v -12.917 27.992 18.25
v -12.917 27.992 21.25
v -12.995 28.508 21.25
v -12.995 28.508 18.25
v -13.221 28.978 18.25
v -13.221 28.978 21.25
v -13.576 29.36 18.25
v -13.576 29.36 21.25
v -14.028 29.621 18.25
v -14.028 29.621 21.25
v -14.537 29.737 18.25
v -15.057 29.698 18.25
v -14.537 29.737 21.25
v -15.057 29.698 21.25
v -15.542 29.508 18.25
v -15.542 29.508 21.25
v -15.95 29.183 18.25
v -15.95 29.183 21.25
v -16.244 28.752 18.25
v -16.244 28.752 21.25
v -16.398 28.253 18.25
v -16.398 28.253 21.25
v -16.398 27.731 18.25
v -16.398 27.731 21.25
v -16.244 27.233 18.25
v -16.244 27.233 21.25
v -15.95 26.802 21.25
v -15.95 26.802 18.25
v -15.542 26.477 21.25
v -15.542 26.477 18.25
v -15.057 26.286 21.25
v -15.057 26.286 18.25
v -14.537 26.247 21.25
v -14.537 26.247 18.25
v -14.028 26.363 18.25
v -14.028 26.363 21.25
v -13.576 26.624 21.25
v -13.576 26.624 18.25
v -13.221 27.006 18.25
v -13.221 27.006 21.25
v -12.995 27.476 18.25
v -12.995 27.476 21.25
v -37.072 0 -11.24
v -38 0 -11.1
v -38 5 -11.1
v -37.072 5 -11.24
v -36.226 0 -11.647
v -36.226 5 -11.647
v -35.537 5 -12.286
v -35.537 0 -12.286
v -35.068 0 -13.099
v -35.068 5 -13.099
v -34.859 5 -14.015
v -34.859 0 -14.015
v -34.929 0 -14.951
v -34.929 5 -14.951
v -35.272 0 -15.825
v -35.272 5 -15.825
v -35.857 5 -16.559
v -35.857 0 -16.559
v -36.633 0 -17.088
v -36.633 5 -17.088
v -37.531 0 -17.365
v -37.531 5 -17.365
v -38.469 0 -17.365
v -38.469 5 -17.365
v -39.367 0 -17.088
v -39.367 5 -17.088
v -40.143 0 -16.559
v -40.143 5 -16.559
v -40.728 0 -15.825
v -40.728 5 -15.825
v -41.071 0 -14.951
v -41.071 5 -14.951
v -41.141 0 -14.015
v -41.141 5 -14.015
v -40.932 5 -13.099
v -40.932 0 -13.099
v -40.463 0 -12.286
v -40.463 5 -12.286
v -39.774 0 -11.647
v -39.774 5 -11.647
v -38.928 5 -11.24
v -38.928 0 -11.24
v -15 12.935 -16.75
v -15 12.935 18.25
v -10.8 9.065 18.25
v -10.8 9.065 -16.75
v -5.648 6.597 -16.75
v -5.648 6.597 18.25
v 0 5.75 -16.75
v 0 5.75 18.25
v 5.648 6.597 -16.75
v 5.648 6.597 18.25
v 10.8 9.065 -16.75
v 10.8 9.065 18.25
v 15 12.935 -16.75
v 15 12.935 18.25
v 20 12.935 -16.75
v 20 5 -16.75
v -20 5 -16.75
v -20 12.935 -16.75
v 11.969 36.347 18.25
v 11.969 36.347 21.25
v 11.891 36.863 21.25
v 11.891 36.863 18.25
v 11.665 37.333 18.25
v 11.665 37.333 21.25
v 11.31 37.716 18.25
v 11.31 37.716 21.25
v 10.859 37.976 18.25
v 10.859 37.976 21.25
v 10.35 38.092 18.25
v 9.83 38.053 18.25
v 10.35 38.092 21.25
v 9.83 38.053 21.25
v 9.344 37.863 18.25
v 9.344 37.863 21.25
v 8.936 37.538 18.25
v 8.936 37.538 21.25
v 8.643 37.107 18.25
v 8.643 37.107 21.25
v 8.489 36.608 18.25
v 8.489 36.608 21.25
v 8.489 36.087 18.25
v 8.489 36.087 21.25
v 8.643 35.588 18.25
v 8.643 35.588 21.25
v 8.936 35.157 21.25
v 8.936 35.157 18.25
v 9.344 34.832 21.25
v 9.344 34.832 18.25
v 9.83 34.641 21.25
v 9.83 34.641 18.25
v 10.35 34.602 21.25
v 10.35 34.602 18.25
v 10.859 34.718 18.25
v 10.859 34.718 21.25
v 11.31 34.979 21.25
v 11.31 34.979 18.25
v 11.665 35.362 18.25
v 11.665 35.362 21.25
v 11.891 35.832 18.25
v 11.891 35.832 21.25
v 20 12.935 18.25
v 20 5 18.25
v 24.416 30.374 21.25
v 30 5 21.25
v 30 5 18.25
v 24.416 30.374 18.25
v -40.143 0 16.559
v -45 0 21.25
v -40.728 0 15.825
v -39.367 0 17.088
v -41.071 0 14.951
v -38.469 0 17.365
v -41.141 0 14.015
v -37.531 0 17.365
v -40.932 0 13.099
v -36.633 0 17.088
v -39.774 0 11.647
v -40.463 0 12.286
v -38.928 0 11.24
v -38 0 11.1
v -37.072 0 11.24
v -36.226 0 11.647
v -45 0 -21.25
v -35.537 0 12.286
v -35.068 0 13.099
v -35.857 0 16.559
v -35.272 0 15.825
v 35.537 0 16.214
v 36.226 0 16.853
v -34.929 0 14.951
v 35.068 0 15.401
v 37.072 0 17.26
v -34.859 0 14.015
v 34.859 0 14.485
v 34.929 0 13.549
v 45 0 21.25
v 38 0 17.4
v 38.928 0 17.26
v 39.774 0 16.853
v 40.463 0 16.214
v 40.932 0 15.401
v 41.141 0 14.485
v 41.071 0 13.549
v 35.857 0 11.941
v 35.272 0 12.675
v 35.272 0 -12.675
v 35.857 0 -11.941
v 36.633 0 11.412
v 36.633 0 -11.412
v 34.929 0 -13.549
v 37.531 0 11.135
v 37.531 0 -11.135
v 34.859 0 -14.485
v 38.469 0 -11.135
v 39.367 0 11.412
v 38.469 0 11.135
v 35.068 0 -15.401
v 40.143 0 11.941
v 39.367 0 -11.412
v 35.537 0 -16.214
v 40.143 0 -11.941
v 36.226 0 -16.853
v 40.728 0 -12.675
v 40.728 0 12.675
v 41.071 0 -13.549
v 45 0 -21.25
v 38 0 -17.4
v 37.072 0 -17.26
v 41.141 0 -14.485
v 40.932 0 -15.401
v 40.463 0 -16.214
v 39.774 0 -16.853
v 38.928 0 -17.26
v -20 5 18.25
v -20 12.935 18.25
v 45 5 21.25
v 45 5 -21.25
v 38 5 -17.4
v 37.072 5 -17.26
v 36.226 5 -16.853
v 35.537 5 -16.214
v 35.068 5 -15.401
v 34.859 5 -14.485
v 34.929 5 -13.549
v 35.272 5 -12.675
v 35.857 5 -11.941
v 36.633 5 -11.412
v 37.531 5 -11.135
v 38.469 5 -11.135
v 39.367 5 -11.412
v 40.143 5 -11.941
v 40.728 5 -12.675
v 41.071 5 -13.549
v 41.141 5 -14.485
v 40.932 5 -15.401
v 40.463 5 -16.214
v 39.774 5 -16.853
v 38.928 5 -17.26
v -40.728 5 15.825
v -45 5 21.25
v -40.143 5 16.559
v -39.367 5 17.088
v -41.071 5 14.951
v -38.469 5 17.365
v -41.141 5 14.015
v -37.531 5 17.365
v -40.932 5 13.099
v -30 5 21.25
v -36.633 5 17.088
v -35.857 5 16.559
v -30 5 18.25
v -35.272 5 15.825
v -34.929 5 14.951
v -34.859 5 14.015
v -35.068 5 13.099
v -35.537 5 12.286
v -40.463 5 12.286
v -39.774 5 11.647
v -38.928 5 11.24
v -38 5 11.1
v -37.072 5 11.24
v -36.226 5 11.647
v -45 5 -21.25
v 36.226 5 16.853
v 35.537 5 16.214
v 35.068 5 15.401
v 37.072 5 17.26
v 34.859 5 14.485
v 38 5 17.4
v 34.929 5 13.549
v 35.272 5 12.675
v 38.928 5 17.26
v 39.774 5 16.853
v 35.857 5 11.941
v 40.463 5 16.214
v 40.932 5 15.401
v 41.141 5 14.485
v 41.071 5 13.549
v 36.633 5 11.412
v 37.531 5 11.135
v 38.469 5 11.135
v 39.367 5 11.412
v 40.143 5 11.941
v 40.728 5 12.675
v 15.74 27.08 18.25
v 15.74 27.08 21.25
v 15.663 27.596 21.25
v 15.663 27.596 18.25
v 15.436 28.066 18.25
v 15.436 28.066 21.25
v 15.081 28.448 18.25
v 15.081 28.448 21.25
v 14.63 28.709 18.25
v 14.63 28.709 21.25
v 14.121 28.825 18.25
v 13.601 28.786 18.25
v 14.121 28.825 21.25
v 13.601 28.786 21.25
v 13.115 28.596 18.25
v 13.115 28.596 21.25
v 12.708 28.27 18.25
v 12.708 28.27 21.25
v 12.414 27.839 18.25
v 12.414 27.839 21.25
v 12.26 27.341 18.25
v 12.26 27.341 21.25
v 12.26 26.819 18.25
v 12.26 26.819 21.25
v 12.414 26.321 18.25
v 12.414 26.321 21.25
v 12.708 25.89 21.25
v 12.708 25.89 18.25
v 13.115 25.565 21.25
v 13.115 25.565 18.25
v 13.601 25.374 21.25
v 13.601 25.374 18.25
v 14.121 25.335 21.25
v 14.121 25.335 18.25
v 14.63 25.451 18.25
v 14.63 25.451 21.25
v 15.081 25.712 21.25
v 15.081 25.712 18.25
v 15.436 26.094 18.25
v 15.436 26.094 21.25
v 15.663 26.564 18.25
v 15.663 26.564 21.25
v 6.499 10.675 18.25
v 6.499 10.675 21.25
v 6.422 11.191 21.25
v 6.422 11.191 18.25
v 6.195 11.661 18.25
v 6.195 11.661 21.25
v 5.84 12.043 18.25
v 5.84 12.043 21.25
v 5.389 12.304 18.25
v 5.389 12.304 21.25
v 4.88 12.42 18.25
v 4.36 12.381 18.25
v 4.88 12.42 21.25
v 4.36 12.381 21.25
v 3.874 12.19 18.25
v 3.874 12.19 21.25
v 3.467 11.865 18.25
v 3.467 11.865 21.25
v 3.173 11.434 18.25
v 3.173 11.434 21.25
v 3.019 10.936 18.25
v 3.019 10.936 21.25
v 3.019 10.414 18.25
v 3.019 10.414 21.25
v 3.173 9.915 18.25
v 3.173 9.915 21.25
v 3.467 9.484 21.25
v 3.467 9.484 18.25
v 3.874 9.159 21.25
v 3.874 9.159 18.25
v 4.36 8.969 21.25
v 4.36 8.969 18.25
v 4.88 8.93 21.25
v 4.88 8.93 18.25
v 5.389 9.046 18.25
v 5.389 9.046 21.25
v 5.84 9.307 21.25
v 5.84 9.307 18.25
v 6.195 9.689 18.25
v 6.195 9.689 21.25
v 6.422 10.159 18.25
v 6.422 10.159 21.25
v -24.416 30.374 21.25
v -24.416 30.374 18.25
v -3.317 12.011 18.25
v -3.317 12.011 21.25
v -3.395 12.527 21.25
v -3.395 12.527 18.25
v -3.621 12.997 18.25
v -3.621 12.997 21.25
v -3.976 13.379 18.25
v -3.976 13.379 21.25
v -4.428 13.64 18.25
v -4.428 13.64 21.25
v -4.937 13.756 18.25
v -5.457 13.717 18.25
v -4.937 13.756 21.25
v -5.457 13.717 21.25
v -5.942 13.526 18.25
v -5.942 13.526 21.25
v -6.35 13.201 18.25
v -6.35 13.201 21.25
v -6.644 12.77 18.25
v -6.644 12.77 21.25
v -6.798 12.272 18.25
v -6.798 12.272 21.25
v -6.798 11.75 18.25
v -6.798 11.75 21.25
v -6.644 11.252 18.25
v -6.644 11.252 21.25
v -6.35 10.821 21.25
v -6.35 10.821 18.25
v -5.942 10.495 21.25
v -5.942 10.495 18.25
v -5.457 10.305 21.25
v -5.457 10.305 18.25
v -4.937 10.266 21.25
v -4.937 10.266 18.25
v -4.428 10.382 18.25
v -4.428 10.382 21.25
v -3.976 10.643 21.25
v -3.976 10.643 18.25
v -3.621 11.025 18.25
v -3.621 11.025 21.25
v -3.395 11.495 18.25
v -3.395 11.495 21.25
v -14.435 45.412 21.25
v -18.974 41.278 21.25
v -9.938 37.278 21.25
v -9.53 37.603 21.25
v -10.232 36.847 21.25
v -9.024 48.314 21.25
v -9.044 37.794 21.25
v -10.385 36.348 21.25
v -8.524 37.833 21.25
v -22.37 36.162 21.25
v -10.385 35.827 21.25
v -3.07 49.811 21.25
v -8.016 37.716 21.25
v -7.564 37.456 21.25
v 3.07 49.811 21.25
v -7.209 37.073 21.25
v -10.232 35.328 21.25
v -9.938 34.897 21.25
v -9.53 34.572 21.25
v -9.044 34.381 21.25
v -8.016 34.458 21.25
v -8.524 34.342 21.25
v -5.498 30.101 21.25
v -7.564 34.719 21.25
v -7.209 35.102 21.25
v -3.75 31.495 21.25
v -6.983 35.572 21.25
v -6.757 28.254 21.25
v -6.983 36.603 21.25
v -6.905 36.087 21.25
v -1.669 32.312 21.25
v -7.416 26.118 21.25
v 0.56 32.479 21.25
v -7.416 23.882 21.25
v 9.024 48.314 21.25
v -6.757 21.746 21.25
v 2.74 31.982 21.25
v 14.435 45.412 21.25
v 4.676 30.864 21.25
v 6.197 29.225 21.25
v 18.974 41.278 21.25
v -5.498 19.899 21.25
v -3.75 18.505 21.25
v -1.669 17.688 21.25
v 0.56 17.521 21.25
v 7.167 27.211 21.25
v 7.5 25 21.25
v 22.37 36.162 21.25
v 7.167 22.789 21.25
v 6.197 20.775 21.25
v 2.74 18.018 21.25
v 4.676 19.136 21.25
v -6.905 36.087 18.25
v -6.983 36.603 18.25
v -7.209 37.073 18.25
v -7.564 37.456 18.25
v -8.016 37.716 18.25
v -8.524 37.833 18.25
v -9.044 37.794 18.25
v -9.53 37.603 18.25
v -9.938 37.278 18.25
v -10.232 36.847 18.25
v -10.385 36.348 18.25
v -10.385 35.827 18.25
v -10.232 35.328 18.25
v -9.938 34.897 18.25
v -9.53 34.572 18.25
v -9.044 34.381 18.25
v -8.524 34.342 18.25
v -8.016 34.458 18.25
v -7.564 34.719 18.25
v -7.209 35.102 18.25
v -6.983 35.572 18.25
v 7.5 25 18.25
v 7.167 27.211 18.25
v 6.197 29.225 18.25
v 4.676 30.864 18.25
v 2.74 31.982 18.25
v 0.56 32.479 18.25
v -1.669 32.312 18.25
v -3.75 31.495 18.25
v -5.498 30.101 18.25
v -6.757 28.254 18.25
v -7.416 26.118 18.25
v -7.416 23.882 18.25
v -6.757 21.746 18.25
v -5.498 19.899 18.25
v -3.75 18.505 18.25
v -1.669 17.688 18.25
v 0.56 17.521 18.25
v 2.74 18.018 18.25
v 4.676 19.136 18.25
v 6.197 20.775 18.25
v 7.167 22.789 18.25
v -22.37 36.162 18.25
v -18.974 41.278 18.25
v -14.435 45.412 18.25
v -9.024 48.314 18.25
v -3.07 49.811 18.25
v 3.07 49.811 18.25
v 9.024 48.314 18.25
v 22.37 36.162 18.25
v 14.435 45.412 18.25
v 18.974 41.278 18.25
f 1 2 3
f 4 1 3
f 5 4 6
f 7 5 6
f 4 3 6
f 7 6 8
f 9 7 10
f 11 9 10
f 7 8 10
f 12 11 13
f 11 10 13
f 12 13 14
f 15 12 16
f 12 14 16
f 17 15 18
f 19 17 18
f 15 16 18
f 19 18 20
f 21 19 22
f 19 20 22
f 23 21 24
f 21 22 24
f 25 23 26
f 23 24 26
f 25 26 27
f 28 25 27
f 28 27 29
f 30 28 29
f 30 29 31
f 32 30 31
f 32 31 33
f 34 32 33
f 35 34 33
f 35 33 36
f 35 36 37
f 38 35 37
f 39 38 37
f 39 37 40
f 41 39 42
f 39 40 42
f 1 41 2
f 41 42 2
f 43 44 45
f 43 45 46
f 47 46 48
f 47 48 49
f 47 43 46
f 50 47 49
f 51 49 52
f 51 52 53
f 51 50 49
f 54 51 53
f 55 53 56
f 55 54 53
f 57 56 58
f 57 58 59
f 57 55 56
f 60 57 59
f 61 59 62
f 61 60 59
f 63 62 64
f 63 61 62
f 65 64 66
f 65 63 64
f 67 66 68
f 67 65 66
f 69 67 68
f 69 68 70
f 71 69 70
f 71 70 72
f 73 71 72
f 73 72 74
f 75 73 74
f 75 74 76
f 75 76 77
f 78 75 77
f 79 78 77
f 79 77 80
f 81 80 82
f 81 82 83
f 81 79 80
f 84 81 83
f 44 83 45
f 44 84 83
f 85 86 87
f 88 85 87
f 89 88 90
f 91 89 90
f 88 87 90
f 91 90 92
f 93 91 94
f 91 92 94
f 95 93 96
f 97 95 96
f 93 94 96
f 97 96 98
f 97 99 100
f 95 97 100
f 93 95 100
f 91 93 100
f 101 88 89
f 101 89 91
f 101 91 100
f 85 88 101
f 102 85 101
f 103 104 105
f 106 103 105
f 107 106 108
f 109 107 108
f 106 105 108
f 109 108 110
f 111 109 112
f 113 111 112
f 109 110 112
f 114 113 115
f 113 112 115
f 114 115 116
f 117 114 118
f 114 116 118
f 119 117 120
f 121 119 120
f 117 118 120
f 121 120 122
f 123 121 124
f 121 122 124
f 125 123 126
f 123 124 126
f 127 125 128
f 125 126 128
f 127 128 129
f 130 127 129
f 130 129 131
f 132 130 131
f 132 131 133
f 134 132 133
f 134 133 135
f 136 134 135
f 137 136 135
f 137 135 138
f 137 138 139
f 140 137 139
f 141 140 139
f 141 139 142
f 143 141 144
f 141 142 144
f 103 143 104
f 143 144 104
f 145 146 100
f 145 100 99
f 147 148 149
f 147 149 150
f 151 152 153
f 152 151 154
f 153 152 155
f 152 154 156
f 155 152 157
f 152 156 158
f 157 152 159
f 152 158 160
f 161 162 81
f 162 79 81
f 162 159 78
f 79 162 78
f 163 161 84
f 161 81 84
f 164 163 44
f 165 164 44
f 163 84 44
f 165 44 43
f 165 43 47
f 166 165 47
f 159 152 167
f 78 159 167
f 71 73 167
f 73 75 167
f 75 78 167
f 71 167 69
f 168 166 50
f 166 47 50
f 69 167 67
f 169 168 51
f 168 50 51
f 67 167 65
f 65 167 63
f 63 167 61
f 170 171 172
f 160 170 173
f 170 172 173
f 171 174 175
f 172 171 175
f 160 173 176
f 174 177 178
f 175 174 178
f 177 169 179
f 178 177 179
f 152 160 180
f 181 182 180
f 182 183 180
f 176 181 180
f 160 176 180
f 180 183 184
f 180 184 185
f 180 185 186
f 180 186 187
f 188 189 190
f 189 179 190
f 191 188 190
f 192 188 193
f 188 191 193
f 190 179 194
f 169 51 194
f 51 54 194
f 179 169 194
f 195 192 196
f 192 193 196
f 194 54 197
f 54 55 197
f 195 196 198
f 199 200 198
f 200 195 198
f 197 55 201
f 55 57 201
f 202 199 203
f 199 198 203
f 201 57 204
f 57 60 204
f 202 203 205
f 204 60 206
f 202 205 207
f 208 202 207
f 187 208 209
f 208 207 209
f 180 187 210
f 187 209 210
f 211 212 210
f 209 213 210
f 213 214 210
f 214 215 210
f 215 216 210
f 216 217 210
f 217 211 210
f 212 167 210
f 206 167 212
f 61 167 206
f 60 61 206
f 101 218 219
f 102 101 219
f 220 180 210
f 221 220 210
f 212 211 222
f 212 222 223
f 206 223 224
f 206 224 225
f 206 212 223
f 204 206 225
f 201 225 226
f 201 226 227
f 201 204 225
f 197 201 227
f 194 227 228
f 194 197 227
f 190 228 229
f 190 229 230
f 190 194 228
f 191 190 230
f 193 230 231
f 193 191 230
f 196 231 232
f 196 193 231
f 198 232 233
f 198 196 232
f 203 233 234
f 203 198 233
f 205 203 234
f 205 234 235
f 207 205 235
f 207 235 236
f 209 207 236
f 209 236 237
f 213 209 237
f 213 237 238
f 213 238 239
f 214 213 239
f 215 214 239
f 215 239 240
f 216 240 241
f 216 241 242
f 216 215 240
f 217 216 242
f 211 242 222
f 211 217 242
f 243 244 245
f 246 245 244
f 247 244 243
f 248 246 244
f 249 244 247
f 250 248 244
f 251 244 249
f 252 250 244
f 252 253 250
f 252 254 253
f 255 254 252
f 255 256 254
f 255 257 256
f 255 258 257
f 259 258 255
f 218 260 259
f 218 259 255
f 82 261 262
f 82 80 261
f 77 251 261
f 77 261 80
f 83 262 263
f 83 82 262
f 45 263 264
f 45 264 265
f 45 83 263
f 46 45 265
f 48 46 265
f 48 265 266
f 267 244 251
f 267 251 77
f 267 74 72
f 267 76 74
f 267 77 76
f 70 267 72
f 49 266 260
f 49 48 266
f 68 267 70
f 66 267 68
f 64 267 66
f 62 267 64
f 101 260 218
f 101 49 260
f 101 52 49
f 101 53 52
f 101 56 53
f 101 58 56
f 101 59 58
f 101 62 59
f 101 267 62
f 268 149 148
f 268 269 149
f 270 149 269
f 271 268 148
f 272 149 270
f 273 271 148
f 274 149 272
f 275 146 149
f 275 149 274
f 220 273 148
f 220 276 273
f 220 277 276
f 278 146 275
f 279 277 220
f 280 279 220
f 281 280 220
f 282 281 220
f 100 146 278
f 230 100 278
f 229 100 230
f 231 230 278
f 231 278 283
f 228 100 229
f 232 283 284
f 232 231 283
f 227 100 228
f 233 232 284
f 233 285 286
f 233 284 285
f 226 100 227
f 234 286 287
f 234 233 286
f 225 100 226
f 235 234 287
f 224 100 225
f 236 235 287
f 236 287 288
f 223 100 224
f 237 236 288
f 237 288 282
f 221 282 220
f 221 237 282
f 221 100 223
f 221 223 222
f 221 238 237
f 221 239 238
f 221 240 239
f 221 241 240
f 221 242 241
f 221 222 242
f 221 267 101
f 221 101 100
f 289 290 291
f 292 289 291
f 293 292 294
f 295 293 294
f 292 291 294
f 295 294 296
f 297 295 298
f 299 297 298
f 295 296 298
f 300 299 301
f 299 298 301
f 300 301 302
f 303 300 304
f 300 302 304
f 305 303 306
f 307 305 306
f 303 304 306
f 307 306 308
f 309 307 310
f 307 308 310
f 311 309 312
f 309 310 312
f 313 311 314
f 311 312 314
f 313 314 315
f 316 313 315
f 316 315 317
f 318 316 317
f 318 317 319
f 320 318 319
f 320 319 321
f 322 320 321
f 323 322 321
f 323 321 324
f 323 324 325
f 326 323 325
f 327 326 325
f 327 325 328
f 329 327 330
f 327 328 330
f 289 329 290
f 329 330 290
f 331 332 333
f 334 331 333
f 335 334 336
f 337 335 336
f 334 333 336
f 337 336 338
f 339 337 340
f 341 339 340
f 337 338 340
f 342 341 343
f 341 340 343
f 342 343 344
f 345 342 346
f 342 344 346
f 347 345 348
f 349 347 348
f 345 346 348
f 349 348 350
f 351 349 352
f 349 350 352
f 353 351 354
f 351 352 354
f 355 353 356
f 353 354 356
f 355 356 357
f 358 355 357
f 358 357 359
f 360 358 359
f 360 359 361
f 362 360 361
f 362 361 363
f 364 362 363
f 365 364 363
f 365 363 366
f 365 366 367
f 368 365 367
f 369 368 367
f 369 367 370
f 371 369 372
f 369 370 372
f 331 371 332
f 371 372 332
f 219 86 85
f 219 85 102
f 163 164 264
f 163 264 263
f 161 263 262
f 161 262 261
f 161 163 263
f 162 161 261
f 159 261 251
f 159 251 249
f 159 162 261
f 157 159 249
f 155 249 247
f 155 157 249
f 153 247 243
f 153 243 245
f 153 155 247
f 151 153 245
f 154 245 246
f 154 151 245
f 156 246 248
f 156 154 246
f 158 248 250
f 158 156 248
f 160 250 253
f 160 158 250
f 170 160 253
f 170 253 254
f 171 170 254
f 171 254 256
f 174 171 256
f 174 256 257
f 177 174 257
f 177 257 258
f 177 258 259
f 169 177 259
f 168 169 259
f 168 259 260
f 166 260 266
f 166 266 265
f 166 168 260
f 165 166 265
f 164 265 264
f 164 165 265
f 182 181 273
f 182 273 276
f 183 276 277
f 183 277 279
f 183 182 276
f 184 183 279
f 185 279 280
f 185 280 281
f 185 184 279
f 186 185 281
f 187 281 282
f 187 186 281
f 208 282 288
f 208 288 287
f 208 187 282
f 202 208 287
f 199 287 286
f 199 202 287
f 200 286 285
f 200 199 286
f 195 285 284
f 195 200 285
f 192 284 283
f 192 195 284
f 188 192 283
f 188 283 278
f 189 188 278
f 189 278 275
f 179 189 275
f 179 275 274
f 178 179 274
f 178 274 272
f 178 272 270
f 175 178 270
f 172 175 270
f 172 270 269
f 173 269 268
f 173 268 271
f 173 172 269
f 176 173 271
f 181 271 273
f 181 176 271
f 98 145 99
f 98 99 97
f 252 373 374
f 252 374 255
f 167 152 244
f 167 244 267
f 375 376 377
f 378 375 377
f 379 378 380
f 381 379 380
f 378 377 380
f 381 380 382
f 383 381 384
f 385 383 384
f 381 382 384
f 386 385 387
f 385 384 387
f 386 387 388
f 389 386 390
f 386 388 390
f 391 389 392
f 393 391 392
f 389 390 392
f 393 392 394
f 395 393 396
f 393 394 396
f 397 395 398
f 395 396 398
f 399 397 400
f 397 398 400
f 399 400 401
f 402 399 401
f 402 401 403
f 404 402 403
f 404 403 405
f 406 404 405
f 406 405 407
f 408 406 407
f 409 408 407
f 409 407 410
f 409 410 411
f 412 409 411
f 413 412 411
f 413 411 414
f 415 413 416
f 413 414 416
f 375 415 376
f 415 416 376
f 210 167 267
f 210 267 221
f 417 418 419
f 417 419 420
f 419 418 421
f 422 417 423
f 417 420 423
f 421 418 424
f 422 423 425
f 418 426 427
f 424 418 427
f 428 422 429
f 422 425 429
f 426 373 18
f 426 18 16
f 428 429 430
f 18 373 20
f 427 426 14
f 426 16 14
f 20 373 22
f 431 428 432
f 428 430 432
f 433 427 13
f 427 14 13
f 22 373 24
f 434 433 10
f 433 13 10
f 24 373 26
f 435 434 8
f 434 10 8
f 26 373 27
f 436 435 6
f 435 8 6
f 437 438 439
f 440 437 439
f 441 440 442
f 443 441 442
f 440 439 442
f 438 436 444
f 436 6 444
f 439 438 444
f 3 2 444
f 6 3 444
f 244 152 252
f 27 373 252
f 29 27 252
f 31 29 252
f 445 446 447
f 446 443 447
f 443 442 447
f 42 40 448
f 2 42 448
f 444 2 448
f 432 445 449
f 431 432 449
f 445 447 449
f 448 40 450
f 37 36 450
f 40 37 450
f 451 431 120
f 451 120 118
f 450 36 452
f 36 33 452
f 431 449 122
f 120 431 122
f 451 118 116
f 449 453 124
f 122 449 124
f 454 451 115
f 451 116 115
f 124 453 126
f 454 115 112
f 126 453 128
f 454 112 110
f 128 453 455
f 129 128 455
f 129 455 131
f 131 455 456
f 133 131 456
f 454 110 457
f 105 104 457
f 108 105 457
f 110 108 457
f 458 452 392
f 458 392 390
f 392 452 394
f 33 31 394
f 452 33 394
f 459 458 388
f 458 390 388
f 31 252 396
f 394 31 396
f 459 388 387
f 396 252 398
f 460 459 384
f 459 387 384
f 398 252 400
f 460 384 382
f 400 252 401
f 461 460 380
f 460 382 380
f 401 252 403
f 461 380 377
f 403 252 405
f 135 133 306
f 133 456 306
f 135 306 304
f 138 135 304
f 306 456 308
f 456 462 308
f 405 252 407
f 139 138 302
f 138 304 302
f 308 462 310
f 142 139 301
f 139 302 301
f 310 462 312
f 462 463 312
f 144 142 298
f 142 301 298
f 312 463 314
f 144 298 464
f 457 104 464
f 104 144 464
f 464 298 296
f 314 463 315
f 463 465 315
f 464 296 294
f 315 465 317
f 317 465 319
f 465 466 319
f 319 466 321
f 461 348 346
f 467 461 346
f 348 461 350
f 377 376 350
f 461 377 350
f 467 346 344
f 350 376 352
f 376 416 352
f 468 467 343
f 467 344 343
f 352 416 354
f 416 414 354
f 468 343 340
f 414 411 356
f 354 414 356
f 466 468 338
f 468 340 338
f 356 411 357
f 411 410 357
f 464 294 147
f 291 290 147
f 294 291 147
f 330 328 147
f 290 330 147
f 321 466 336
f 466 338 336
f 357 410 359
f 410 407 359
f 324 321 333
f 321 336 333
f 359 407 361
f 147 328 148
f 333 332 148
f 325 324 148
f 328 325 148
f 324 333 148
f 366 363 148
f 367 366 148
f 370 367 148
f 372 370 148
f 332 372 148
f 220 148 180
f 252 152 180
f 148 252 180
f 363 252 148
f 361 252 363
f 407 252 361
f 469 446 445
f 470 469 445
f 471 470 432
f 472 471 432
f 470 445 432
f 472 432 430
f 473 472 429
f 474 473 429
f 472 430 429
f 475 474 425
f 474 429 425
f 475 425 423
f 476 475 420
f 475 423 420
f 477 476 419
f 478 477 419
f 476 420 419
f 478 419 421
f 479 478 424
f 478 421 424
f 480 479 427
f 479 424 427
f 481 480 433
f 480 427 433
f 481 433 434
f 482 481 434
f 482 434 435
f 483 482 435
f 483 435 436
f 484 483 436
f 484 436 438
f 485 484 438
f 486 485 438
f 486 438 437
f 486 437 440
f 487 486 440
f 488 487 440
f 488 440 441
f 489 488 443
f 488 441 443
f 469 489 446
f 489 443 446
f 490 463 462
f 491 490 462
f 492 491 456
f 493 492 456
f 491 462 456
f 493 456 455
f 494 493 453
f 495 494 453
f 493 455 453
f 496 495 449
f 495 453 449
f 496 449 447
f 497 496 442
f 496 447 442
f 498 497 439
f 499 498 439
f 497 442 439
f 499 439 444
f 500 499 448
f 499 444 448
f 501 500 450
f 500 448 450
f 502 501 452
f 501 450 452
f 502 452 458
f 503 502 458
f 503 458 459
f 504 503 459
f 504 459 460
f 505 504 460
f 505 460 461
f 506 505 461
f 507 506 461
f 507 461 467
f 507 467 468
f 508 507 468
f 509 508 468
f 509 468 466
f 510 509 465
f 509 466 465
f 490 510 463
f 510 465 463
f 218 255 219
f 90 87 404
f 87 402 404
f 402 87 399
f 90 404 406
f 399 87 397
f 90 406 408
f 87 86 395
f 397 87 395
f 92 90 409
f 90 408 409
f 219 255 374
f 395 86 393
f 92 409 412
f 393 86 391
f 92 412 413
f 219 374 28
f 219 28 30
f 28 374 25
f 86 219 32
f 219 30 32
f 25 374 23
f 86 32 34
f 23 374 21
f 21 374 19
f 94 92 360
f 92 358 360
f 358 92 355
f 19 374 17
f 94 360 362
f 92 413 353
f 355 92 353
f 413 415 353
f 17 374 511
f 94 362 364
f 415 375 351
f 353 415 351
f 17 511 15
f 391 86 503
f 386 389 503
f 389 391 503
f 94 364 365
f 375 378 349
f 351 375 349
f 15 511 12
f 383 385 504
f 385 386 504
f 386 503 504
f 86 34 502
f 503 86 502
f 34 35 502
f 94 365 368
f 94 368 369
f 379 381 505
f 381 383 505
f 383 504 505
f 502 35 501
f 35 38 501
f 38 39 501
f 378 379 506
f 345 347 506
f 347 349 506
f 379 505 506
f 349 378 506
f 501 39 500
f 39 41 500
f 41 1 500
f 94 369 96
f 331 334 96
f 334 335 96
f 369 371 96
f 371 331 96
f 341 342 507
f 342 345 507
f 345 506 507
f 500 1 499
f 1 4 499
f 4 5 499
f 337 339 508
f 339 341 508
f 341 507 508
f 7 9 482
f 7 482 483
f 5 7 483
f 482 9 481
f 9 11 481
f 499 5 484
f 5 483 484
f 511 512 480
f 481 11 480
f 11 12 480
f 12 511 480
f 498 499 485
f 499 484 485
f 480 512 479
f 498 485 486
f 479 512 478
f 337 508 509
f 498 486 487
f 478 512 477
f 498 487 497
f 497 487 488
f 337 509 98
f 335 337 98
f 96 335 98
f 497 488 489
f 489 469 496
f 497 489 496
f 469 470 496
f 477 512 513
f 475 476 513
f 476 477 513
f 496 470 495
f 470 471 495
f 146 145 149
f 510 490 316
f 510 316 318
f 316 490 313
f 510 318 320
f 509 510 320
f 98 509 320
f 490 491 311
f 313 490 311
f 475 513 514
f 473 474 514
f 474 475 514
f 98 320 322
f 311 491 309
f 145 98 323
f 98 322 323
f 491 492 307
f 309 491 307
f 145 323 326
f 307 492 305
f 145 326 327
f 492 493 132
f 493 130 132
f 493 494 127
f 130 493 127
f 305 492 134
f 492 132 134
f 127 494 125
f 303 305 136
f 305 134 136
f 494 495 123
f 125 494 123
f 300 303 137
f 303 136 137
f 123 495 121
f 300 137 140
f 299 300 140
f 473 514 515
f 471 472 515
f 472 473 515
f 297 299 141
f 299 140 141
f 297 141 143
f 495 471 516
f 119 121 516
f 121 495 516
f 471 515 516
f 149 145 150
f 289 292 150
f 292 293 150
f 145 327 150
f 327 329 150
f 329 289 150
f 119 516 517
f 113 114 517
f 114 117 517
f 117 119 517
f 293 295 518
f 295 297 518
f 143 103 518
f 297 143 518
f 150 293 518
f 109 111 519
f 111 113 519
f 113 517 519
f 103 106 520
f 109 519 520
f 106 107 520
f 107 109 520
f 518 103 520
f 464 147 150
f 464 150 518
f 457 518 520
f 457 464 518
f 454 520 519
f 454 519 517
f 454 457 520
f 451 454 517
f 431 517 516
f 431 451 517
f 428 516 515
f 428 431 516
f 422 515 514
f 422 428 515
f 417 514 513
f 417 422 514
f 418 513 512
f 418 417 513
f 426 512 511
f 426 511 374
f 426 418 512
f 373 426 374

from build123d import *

# Parameters (mm, degrees)
SKETCH3_W           = 90
SKETCH3_H           = 42.5
SKETCH3_R           = 3.15
BOSS_EXTRUDE1_DEPTH = 5
SKETCH4_R           = 1.75
SKETCH4_R_2         = 7.5
BOSS_EXTRUDE2_DEPTH = 3
SKETCH5_W           = 5
SKETCH5_H           = 7.935071488
BOSS_EXTRUDE3_DEPTH = 35


with BuildPart() as part:
    # Sketch3 → Boss-Extrude1 (new body)
    with BuildSketch(Plane(origin=(0, 0, 0), x_dir=(1, 0, 0), z_dir=(0, 1, 0))):
        Rectangle(SKETCH3_W, SKETCH3_H)
        with Locations(Location((-38, 14.25, 0), (0, 0, 270))):
            Circle(SKETCH3_R, mode=Mode.SUBTRACT)
        with Locations(Location((38, 14.25, 0), (0, 0, 90))):
            Circle(SKETCH3_R, mode=Mode.SUBTRACT)
        with Locations(Location((38, -14.25, 0), (0, 0, 270))):
            Circle(SKETCH3_R, mode=Mode.SUBTRACT)
        with Locations(Location((-38, -14.25, 0), (0, 0, 90))):
            Circle(SKETCH3_R, mode=Mode.SUBTRACT)
    extrude(amount=BOSS_EXTRUDE1_DEPTH)

    # Sketch4 → Boss-Extrude2 (add)
    with BuildSketch(Plane.XY.offset(21.25)):
        with BuildLine():
            Line((-30, 5), (30, 5))
            Line((30, 5), (24.415677736, 30.373516604))
            ThreePointArc((24.415677736, 30.373516604), (0, 50), (-24.415677736, 30.373516604))
            Line((-24.415677736, 30.373516604), (-30, 5))
        make_face()
        with Locations((10.21923709, 36.347341968)):
            Circle(SKETCH4_R, mode=Mode.SUBTRACT)
        with Locations((-5.067303705, 12.010919994)):
            Circle(SKETCH4_R, mode=Mode.SUBTRACT)
        with Locations((4.749376983, 10.674714152)):
            Circle(SKETCH4_R, mode=Mode.SUBTRACT)
        with Locations((0, 25)):
            Circle(SKETCH4_R_2, mode=Mode.SUBTRACT)
        with Locations((13.990382911, 27.080076467)):
            Circle(SKETCH4_R, mode=Mode.SUBTRACT)
        with Locations((-14.667309102, 27.992284383)):
            Circle(SKETCH4_R, mode=Mode.SUBTRACT)
        with Locations((-8.654917128, 36.087456884)):
            Circle(SKETCH4_R, mode=Mode.SUBTRACT)
    extrude(amount=-BOSS_EXTRUDE2_DEPTH)

    # Sketch5 → Boss-Extrude3 (add)
    with BuildSketch(Plane(origin=(0, 0, 18.25), x_dir=(-1, 0, 0), z_dir=(0, 0, -1))):
        with BuildLine():
            ThreePointArc((15, 12.935071488), (0, 5.75), (-15, 12.935071488))
            Line((-15, 12.935071488), (-15, 5))
            Line((-15, 5), (15, 5))
            Line((15, 5), (15, 12.935071488))
        make_face()
        with Locations((-17.5, 8.967535744)):
            Rectangle(SKETCH5_W, SKETCH5_H)
        with Locations((17.5, 8.967535744)):
            Rectangle(SKETCH5_W, SKETCH5_H)
    extrude(amount=BOSS_EXTRUDE3_DEPTH)


solid = part.part
